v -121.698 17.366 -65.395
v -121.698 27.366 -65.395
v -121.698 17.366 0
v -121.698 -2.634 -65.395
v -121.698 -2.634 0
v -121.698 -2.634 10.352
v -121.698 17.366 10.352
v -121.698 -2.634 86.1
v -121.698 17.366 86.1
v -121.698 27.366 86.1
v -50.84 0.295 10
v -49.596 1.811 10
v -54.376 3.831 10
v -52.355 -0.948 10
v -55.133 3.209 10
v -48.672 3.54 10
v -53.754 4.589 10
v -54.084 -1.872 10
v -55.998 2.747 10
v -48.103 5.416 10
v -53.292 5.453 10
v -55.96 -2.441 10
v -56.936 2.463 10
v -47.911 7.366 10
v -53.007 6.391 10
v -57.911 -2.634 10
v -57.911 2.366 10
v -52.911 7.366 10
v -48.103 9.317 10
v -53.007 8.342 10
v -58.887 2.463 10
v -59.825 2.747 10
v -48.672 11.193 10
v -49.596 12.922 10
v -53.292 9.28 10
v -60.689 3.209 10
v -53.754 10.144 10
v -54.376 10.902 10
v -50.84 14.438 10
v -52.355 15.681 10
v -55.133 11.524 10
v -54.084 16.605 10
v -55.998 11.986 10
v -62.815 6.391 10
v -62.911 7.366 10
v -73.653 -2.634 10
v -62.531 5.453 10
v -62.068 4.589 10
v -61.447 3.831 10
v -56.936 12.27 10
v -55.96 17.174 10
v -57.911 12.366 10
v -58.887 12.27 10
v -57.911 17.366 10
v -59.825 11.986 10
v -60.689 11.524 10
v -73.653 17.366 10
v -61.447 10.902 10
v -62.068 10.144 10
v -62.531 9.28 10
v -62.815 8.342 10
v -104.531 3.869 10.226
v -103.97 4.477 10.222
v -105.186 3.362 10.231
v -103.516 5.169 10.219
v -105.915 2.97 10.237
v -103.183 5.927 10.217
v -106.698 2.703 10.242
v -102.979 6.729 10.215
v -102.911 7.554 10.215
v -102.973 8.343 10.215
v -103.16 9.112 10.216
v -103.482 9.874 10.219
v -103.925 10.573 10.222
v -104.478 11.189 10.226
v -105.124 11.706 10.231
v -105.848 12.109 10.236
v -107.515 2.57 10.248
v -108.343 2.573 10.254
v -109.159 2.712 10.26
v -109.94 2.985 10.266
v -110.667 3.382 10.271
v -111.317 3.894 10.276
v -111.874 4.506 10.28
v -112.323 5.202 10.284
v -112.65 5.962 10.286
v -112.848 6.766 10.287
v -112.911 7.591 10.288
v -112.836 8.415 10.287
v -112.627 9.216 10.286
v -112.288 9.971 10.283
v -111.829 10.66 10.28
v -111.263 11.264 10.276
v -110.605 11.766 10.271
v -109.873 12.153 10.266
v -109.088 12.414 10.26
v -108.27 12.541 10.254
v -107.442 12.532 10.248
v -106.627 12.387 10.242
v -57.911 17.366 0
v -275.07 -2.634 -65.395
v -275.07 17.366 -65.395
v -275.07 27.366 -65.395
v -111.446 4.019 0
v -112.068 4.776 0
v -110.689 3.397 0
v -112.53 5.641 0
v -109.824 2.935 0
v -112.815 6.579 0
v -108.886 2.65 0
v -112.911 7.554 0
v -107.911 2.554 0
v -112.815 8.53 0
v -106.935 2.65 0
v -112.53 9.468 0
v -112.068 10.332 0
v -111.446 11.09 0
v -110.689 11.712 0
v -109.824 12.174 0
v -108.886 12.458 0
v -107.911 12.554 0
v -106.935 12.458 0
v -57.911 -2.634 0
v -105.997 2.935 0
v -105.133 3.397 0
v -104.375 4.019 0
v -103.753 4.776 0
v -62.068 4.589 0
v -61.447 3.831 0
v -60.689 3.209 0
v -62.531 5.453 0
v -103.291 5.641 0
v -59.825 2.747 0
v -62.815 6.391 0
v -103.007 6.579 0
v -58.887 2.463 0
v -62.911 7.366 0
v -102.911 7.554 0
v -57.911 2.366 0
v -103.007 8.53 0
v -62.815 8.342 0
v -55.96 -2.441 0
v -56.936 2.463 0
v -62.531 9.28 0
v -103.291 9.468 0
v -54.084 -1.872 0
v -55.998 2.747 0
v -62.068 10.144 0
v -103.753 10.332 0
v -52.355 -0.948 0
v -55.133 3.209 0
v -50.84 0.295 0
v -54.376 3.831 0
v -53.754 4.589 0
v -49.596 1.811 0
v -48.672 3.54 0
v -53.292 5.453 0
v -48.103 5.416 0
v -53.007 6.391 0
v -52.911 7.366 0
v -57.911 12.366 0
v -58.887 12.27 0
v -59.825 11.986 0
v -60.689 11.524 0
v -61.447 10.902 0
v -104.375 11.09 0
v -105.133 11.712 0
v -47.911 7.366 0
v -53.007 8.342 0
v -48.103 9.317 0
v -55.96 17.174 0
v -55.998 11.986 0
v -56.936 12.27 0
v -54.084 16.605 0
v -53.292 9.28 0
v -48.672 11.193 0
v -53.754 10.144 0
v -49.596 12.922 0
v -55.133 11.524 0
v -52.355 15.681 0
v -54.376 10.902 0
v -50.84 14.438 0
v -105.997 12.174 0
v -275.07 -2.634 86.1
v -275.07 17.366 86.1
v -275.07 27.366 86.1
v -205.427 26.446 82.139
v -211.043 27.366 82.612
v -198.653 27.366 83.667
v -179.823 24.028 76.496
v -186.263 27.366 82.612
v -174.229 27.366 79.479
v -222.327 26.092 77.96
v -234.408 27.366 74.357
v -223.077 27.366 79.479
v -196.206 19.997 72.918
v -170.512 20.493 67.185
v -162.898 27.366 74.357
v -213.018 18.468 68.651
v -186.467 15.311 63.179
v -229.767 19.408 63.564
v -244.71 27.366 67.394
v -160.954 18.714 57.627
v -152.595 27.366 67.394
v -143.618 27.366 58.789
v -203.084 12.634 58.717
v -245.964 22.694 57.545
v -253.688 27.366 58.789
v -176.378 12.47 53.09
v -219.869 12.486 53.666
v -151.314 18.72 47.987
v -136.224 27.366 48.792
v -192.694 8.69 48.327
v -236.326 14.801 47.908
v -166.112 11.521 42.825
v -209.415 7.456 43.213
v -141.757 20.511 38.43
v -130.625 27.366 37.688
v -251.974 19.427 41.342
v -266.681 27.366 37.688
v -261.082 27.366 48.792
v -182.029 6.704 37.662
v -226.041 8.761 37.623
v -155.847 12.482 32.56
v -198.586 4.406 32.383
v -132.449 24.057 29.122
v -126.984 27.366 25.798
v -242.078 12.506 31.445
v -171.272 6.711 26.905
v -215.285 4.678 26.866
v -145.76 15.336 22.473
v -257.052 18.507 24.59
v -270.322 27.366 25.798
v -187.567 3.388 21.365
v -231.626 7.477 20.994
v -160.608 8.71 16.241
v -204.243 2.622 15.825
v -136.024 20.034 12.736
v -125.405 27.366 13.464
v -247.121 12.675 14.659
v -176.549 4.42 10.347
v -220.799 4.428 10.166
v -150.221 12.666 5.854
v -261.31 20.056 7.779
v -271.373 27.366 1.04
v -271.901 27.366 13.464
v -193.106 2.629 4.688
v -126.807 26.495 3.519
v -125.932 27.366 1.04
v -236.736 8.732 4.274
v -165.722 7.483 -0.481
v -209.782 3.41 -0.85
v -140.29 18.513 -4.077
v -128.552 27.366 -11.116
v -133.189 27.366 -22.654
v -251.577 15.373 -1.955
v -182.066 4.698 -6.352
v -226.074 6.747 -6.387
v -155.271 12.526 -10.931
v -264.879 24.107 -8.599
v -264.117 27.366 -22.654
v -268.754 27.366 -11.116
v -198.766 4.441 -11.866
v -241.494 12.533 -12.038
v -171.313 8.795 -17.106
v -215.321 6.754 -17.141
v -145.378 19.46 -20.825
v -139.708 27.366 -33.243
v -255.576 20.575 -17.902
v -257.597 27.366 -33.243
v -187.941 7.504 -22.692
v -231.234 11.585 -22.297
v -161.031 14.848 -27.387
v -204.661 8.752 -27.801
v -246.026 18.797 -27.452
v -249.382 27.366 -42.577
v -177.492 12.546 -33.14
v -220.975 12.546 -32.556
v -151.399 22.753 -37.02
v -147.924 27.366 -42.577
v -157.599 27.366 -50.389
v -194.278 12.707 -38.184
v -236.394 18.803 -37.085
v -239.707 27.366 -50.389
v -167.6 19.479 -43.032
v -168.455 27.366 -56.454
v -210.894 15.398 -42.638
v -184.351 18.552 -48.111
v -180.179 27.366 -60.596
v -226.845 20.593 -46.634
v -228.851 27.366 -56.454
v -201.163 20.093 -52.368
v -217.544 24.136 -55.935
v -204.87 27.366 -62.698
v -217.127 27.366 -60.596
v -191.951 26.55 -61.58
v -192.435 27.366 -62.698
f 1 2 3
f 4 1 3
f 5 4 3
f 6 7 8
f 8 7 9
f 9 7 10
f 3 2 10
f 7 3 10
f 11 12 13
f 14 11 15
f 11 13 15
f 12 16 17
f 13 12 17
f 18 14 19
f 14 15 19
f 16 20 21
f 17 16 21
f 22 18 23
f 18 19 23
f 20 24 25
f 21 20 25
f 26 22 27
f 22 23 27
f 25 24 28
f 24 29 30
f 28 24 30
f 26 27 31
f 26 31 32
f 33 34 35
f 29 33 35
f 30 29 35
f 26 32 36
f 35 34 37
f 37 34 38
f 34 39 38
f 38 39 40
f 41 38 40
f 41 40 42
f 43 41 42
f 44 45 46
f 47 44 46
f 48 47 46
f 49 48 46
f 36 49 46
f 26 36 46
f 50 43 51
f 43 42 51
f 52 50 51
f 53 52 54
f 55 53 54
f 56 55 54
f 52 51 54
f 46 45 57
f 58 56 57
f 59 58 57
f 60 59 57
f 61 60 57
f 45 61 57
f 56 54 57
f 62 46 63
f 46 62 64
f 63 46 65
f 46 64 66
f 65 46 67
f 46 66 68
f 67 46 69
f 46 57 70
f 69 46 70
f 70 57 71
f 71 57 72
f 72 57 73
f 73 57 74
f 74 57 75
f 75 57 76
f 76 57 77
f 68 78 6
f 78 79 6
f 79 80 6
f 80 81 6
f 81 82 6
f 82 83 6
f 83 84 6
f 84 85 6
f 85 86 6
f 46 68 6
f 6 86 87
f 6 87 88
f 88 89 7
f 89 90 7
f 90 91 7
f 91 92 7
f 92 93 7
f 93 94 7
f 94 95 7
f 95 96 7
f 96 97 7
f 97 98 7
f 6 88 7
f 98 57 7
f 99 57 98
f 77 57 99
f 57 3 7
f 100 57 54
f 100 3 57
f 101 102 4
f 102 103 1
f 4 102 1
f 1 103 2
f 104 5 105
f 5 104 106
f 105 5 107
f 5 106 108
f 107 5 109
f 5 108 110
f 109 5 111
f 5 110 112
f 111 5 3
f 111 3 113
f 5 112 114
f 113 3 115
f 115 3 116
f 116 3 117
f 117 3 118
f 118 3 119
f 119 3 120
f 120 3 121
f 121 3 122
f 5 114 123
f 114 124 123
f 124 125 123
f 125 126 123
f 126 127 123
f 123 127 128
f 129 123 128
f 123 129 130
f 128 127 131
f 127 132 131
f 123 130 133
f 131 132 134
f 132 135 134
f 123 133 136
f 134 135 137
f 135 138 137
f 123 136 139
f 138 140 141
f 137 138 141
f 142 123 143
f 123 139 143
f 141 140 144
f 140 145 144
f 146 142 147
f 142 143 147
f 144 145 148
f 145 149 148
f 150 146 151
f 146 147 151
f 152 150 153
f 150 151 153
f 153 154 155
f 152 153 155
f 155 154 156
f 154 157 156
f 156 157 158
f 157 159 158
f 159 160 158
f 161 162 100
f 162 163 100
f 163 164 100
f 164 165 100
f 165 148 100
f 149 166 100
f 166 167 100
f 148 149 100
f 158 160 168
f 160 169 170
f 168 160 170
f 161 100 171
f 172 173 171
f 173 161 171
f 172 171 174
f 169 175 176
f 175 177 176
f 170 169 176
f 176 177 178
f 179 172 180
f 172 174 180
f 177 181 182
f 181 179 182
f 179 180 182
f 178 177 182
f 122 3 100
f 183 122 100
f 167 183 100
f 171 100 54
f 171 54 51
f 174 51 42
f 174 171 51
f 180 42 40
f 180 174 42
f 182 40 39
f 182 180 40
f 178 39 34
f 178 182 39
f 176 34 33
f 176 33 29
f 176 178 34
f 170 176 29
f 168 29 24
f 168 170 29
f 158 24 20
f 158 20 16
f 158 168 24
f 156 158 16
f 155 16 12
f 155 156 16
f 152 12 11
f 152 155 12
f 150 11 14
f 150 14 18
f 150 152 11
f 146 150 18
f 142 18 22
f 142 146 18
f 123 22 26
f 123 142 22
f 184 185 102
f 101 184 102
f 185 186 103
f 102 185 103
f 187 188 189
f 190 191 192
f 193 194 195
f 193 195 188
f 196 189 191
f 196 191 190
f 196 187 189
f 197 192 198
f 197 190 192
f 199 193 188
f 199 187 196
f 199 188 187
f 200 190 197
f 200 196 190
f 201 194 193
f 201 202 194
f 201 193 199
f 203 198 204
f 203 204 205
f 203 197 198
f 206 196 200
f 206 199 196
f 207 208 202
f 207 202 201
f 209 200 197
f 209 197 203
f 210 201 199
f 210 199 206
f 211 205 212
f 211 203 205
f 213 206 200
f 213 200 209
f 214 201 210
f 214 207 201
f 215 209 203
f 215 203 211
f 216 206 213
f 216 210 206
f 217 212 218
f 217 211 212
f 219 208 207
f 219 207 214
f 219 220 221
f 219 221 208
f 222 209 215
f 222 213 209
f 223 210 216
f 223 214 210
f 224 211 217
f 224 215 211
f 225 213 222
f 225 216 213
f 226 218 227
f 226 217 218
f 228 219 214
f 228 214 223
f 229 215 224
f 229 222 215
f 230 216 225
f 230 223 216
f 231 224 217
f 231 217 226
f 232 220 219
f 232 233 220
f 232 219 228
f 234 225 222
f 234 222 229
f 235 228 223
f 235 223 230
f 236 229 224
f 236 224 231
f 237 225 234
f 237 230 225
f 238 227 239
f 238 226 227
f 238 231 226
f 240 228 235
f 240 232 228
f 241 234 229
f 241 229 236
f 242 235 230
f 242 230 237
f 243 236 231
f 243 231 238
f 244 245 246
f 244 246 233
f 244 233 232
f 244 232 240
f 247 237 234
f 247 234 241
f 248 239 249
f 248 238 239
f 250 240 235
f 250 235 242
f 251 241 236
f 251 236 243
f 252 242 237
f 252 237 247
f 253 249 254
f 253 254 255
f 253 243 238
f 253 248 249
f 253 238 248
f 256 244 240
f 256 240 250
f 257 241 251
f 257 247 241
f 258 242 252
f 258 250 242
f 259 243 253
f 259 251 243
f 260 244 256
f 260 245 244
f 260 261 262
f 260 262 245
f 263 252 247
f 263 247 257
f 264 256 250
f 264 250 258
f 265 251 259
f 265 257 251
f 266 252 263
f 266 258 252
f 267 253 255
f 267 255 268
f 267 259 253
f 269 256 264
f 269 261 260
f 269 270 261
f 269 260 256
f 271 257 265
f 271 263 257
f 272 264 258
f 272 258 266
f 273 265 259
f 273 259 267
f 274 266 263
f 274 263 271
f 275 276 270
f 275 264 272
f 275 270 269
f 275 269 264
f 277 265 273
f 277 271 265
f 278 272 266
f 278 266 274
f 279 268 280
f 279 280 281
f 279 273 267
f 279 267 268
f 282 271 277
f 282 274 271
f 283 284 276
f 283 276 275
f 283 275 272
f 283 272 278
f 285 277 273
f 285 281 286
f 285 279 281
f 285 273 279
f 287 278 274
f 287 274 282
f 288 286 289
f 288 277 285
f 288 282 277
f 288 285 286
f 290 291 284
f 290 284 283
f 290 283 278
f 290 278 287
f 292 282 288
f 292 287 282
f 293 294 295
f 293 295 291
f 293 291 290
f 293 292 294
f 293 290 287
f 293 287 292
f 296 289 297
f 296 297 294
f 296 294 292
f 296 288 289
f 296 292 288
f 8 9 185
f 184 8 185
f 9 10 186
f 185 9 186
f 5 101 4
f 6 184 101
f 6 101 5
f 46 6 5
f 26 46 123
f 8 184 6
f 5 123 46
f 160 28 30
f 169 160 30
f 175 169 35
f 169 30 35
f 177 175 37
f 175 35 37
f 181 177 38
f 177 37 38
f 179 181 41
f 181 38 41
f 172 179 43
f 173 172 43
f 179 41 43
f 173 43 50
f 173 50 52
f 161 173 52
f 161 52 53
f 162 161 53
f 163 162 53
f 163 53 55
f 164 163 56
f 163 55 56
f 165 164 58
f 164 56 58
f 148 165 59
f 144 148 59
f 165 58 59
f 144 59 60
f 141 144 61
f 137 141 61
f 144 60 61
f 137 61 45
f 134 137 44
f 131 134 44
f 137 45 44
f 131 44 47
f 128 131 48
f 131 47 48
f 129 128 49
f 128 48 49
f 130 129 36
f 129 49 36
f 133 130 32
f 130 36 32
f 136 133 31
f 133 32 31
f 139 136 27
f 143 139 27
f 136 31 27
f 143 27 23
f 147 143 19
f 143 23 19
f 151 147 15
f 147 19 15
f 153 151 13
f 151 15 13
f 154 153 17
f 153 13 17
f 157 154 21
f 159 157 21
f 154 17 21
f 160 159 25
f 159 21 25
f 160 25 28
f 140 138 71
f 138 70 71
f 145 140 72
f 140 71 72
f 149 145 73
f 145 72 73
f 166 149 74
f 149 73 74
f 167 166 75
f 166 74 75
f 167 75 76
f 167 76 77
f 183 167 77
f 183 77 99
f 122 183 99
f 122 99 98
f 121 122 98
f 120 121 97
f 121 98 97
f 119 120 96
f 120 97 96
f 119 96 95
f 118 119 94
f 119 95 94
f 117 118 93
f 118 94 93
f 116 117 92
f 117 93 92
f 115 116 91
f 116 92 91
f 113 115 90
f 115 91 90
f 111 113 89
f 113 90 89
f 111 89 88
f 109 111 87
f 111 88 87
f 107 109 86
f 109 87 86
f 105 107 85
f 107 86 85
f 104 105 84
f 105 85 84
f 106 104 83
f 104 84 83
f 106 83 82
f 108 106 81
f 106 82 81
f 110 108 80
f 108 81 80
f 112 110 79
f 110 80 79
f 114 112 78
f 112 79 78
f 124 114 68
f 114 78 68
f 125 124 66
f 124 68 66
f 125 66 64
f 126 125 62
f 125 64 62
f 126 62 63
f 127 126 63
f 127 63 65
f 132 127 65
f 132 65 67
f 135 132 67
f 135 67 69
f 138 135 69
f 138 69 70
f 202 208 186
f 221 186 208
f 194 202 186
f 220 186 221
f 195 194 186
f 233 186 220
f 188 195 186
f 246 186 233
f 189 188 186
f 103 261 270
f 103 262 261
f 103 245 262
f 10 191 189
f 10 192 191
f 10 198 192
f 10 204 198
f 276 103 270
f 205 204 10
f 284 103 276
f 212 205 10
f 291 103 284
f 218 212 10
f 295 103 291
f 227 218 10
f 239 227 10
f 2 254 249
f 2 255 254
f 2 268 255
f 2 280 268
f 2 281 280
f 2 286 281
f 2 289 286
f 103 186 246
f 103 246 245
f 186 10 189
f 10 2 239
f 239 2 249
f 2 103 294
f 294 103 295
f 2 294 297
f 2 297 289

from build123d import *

# Parameters (mm, degrees)
EXTRUDE_1_DEPTH     = 10
SKETCH_2_R          = 5
CUT_EXTRUDE_1_DEPTH = 10
SKETCH_3_W          = 250
SKETCH_3_H          = 250
EXTRUDE_2_DEPTH     = 125
SKETCH_5_W          = 250
SKETCH_5_H          = 250
CUT_EXTRUDE_2_DEPTH = 95
SKETCH_8_W          = 250
SKETCH_8_H          = 250
SKETCH_8_W_2        = 153.371517144
SKETCH_8_H_2        = 151.494592983
CUT_EXTRUDE_4_DEPTH = 10
CUT_EXTRUDE_5_DEPTH = 352.385042723
SKETCH_10_R         = 5
CUT_EXTRUDE_7_DEPTH = 287.71149486
SKETCH_12_R         = 5
CUT_EXTRUDE_8_DEPTH = 287.71149486


with BuildPart() as part:
    # 草图1 → 凸台-拉伸1 (new body)
    with BuildSketch(Plane.XY):
        with BuildLine():
            Line((-217.911131847, 17.366483315), (-57.911131847, 17.366483315))
            ThreePointArc((-57.911131847, 17.366483315), (-47.911131847, 7.366483315), (-57.911131847, -2.633516685))
            Line((-57.911131847, -2.633516685), (-217.911131847, -2.633516685))
            Line((-217.911131847, -2.633516685), (-217.911131847, 17.366483315))
        make_face()
    extrude(amount=EXTRUDE_1_DEPTH)

    # 草图2 → 切除-拉伸1 (cut)
    with BuildSketch(Plane.XY.offset(10)):
        with Locations((-57.911131847, 7.366483315)):
            Circle(SKETCH_2_R)
        with Locations((-7.911347857, 7.219510907)):
            Circle(SKETCH_2_R)
    extrude(amount=-CUT_EXTRUDE_1_DEPTH, mode=Mode.SUBTRACT)

    # 草图3 → 凸台-拉伸2 (add)
    with BuildSketch(Plane.XZ.offset(2.633516685)):
        with Locations((-198.652892484, 10.352330738)):
            Rectangle(SKETCH_3_W, SKETCH_3_H)
    extrude(amount=-EXTRUDE_2_DEPTH)

    # 草图4 → 切除-旋转1 (revolve, cut)
    with BuildSketch(Plane(origin=(0, 122.366483315, 0), x_dir=(1, 0, 0), z_dir=(0, 1, 0))):
        with BuildLine():
            Line((-283.505706227, 74.500483004), (-113.800078742, -95.205144481))
            ThreePointArc((-113.800078742, -95.205144481), (-283.505706227, -95.205144481), (-283.505706227, 74.500483004))
        make_face()
    revolve(axis=Axis((-283.505706227, 122.366483315, -74.500483004), (0.7071067811865477, 0, 0.7071067811865474)), mode=Mode.SUBTRACT)

    # 草图5 → 切除-拉伸2 (cut)
    with BuildSketch(Plane(origin=(0, 122.366483315, 0), x_dir=(1, 0, 0), z_dir=(0, 1, 0))):
        with Locations((-198.652892484, -10.352330738)):
            Rectangle(SKETCH_5_W, SKETCH_5_H)
    extrude(amount=-CUT_EXTRUDE_2_DEPTH, mode=Mode.SUBTRACT)

    # 草图8 → 切除-拉伸4 (cut)
    with BuildSketch(Plane(origin=(0, 27.366483315, 0), x_dir=(1, 0, 0), z_dir=(0, 1, 0))):
        with Locations((-198.652892484, -10.352330738)):
            Rectangle(SKETCH_8_W, SKETCH_8_H)
        with Locations((-198.384057314, -10.352330739)):
            Rectangle(SKETCH_8_W_2, SKETCH_8_H_2, mode=Mode.SUBTRACT)
    extrude(amount=-CUT_EXTRUDE_4_DEPTH, mode=Mode.SUBTRACT)

    # 草图9 → 切除-拉伸5 (cut, through all)
    with BuildSketch(Plane(origin=(0, 17.366483315, 0), x_dir=(1, 0, 0), z_dir=(0, 1, 0))):
        Polygon((-275.069815886, -86.09962723), (-275.069815886, 65.394965753), (-121.698298742, 65.394965753), (-121.698298742, 0), (-73.652892484, 0), (-73.652892484, 114.647669262), (-323.652892484, 114.647669262), (-323.652892484, -135.352330738), (-73.652892484, -135.352330738), (-73.652892484, -10), (-121.698298742, -10.352330738), (-121.698298742, -86.09962723), align=None)
    extrude(amount=-CUT_EXTRUDE_5_DEPTH, mode=Mode.SUBTRACT)

    # 草图10 → 切除-拉伸7 (cut, through all)
    with BuildSketch(Plane.XY.offset(10)):
        with Locations((-107.91077949, 7.55419482)):
            Circle(SKETCH_10_R)
    extrude(amount=-CUT_EXTRUDE_7_DEPTH, mode=Mode.SUBTRACT)

    # 草图12 → 切除-拉伸8 (cut, through all)
    with BuildSketch(Plane(origin=(0, 0, 10), x_dir=(-1, 0, 0), z_dir=(0, 0, -1))):
        with Locations(Location((107.91077949, 7.55419482, 0), (0, 0, 180))):
            Circle(SKETCH_12_R)
    extrude(amount=-CUT_EXTRUDE_8_DEPTH, mode=Mode.SUBTRACT)


solid = part.part
